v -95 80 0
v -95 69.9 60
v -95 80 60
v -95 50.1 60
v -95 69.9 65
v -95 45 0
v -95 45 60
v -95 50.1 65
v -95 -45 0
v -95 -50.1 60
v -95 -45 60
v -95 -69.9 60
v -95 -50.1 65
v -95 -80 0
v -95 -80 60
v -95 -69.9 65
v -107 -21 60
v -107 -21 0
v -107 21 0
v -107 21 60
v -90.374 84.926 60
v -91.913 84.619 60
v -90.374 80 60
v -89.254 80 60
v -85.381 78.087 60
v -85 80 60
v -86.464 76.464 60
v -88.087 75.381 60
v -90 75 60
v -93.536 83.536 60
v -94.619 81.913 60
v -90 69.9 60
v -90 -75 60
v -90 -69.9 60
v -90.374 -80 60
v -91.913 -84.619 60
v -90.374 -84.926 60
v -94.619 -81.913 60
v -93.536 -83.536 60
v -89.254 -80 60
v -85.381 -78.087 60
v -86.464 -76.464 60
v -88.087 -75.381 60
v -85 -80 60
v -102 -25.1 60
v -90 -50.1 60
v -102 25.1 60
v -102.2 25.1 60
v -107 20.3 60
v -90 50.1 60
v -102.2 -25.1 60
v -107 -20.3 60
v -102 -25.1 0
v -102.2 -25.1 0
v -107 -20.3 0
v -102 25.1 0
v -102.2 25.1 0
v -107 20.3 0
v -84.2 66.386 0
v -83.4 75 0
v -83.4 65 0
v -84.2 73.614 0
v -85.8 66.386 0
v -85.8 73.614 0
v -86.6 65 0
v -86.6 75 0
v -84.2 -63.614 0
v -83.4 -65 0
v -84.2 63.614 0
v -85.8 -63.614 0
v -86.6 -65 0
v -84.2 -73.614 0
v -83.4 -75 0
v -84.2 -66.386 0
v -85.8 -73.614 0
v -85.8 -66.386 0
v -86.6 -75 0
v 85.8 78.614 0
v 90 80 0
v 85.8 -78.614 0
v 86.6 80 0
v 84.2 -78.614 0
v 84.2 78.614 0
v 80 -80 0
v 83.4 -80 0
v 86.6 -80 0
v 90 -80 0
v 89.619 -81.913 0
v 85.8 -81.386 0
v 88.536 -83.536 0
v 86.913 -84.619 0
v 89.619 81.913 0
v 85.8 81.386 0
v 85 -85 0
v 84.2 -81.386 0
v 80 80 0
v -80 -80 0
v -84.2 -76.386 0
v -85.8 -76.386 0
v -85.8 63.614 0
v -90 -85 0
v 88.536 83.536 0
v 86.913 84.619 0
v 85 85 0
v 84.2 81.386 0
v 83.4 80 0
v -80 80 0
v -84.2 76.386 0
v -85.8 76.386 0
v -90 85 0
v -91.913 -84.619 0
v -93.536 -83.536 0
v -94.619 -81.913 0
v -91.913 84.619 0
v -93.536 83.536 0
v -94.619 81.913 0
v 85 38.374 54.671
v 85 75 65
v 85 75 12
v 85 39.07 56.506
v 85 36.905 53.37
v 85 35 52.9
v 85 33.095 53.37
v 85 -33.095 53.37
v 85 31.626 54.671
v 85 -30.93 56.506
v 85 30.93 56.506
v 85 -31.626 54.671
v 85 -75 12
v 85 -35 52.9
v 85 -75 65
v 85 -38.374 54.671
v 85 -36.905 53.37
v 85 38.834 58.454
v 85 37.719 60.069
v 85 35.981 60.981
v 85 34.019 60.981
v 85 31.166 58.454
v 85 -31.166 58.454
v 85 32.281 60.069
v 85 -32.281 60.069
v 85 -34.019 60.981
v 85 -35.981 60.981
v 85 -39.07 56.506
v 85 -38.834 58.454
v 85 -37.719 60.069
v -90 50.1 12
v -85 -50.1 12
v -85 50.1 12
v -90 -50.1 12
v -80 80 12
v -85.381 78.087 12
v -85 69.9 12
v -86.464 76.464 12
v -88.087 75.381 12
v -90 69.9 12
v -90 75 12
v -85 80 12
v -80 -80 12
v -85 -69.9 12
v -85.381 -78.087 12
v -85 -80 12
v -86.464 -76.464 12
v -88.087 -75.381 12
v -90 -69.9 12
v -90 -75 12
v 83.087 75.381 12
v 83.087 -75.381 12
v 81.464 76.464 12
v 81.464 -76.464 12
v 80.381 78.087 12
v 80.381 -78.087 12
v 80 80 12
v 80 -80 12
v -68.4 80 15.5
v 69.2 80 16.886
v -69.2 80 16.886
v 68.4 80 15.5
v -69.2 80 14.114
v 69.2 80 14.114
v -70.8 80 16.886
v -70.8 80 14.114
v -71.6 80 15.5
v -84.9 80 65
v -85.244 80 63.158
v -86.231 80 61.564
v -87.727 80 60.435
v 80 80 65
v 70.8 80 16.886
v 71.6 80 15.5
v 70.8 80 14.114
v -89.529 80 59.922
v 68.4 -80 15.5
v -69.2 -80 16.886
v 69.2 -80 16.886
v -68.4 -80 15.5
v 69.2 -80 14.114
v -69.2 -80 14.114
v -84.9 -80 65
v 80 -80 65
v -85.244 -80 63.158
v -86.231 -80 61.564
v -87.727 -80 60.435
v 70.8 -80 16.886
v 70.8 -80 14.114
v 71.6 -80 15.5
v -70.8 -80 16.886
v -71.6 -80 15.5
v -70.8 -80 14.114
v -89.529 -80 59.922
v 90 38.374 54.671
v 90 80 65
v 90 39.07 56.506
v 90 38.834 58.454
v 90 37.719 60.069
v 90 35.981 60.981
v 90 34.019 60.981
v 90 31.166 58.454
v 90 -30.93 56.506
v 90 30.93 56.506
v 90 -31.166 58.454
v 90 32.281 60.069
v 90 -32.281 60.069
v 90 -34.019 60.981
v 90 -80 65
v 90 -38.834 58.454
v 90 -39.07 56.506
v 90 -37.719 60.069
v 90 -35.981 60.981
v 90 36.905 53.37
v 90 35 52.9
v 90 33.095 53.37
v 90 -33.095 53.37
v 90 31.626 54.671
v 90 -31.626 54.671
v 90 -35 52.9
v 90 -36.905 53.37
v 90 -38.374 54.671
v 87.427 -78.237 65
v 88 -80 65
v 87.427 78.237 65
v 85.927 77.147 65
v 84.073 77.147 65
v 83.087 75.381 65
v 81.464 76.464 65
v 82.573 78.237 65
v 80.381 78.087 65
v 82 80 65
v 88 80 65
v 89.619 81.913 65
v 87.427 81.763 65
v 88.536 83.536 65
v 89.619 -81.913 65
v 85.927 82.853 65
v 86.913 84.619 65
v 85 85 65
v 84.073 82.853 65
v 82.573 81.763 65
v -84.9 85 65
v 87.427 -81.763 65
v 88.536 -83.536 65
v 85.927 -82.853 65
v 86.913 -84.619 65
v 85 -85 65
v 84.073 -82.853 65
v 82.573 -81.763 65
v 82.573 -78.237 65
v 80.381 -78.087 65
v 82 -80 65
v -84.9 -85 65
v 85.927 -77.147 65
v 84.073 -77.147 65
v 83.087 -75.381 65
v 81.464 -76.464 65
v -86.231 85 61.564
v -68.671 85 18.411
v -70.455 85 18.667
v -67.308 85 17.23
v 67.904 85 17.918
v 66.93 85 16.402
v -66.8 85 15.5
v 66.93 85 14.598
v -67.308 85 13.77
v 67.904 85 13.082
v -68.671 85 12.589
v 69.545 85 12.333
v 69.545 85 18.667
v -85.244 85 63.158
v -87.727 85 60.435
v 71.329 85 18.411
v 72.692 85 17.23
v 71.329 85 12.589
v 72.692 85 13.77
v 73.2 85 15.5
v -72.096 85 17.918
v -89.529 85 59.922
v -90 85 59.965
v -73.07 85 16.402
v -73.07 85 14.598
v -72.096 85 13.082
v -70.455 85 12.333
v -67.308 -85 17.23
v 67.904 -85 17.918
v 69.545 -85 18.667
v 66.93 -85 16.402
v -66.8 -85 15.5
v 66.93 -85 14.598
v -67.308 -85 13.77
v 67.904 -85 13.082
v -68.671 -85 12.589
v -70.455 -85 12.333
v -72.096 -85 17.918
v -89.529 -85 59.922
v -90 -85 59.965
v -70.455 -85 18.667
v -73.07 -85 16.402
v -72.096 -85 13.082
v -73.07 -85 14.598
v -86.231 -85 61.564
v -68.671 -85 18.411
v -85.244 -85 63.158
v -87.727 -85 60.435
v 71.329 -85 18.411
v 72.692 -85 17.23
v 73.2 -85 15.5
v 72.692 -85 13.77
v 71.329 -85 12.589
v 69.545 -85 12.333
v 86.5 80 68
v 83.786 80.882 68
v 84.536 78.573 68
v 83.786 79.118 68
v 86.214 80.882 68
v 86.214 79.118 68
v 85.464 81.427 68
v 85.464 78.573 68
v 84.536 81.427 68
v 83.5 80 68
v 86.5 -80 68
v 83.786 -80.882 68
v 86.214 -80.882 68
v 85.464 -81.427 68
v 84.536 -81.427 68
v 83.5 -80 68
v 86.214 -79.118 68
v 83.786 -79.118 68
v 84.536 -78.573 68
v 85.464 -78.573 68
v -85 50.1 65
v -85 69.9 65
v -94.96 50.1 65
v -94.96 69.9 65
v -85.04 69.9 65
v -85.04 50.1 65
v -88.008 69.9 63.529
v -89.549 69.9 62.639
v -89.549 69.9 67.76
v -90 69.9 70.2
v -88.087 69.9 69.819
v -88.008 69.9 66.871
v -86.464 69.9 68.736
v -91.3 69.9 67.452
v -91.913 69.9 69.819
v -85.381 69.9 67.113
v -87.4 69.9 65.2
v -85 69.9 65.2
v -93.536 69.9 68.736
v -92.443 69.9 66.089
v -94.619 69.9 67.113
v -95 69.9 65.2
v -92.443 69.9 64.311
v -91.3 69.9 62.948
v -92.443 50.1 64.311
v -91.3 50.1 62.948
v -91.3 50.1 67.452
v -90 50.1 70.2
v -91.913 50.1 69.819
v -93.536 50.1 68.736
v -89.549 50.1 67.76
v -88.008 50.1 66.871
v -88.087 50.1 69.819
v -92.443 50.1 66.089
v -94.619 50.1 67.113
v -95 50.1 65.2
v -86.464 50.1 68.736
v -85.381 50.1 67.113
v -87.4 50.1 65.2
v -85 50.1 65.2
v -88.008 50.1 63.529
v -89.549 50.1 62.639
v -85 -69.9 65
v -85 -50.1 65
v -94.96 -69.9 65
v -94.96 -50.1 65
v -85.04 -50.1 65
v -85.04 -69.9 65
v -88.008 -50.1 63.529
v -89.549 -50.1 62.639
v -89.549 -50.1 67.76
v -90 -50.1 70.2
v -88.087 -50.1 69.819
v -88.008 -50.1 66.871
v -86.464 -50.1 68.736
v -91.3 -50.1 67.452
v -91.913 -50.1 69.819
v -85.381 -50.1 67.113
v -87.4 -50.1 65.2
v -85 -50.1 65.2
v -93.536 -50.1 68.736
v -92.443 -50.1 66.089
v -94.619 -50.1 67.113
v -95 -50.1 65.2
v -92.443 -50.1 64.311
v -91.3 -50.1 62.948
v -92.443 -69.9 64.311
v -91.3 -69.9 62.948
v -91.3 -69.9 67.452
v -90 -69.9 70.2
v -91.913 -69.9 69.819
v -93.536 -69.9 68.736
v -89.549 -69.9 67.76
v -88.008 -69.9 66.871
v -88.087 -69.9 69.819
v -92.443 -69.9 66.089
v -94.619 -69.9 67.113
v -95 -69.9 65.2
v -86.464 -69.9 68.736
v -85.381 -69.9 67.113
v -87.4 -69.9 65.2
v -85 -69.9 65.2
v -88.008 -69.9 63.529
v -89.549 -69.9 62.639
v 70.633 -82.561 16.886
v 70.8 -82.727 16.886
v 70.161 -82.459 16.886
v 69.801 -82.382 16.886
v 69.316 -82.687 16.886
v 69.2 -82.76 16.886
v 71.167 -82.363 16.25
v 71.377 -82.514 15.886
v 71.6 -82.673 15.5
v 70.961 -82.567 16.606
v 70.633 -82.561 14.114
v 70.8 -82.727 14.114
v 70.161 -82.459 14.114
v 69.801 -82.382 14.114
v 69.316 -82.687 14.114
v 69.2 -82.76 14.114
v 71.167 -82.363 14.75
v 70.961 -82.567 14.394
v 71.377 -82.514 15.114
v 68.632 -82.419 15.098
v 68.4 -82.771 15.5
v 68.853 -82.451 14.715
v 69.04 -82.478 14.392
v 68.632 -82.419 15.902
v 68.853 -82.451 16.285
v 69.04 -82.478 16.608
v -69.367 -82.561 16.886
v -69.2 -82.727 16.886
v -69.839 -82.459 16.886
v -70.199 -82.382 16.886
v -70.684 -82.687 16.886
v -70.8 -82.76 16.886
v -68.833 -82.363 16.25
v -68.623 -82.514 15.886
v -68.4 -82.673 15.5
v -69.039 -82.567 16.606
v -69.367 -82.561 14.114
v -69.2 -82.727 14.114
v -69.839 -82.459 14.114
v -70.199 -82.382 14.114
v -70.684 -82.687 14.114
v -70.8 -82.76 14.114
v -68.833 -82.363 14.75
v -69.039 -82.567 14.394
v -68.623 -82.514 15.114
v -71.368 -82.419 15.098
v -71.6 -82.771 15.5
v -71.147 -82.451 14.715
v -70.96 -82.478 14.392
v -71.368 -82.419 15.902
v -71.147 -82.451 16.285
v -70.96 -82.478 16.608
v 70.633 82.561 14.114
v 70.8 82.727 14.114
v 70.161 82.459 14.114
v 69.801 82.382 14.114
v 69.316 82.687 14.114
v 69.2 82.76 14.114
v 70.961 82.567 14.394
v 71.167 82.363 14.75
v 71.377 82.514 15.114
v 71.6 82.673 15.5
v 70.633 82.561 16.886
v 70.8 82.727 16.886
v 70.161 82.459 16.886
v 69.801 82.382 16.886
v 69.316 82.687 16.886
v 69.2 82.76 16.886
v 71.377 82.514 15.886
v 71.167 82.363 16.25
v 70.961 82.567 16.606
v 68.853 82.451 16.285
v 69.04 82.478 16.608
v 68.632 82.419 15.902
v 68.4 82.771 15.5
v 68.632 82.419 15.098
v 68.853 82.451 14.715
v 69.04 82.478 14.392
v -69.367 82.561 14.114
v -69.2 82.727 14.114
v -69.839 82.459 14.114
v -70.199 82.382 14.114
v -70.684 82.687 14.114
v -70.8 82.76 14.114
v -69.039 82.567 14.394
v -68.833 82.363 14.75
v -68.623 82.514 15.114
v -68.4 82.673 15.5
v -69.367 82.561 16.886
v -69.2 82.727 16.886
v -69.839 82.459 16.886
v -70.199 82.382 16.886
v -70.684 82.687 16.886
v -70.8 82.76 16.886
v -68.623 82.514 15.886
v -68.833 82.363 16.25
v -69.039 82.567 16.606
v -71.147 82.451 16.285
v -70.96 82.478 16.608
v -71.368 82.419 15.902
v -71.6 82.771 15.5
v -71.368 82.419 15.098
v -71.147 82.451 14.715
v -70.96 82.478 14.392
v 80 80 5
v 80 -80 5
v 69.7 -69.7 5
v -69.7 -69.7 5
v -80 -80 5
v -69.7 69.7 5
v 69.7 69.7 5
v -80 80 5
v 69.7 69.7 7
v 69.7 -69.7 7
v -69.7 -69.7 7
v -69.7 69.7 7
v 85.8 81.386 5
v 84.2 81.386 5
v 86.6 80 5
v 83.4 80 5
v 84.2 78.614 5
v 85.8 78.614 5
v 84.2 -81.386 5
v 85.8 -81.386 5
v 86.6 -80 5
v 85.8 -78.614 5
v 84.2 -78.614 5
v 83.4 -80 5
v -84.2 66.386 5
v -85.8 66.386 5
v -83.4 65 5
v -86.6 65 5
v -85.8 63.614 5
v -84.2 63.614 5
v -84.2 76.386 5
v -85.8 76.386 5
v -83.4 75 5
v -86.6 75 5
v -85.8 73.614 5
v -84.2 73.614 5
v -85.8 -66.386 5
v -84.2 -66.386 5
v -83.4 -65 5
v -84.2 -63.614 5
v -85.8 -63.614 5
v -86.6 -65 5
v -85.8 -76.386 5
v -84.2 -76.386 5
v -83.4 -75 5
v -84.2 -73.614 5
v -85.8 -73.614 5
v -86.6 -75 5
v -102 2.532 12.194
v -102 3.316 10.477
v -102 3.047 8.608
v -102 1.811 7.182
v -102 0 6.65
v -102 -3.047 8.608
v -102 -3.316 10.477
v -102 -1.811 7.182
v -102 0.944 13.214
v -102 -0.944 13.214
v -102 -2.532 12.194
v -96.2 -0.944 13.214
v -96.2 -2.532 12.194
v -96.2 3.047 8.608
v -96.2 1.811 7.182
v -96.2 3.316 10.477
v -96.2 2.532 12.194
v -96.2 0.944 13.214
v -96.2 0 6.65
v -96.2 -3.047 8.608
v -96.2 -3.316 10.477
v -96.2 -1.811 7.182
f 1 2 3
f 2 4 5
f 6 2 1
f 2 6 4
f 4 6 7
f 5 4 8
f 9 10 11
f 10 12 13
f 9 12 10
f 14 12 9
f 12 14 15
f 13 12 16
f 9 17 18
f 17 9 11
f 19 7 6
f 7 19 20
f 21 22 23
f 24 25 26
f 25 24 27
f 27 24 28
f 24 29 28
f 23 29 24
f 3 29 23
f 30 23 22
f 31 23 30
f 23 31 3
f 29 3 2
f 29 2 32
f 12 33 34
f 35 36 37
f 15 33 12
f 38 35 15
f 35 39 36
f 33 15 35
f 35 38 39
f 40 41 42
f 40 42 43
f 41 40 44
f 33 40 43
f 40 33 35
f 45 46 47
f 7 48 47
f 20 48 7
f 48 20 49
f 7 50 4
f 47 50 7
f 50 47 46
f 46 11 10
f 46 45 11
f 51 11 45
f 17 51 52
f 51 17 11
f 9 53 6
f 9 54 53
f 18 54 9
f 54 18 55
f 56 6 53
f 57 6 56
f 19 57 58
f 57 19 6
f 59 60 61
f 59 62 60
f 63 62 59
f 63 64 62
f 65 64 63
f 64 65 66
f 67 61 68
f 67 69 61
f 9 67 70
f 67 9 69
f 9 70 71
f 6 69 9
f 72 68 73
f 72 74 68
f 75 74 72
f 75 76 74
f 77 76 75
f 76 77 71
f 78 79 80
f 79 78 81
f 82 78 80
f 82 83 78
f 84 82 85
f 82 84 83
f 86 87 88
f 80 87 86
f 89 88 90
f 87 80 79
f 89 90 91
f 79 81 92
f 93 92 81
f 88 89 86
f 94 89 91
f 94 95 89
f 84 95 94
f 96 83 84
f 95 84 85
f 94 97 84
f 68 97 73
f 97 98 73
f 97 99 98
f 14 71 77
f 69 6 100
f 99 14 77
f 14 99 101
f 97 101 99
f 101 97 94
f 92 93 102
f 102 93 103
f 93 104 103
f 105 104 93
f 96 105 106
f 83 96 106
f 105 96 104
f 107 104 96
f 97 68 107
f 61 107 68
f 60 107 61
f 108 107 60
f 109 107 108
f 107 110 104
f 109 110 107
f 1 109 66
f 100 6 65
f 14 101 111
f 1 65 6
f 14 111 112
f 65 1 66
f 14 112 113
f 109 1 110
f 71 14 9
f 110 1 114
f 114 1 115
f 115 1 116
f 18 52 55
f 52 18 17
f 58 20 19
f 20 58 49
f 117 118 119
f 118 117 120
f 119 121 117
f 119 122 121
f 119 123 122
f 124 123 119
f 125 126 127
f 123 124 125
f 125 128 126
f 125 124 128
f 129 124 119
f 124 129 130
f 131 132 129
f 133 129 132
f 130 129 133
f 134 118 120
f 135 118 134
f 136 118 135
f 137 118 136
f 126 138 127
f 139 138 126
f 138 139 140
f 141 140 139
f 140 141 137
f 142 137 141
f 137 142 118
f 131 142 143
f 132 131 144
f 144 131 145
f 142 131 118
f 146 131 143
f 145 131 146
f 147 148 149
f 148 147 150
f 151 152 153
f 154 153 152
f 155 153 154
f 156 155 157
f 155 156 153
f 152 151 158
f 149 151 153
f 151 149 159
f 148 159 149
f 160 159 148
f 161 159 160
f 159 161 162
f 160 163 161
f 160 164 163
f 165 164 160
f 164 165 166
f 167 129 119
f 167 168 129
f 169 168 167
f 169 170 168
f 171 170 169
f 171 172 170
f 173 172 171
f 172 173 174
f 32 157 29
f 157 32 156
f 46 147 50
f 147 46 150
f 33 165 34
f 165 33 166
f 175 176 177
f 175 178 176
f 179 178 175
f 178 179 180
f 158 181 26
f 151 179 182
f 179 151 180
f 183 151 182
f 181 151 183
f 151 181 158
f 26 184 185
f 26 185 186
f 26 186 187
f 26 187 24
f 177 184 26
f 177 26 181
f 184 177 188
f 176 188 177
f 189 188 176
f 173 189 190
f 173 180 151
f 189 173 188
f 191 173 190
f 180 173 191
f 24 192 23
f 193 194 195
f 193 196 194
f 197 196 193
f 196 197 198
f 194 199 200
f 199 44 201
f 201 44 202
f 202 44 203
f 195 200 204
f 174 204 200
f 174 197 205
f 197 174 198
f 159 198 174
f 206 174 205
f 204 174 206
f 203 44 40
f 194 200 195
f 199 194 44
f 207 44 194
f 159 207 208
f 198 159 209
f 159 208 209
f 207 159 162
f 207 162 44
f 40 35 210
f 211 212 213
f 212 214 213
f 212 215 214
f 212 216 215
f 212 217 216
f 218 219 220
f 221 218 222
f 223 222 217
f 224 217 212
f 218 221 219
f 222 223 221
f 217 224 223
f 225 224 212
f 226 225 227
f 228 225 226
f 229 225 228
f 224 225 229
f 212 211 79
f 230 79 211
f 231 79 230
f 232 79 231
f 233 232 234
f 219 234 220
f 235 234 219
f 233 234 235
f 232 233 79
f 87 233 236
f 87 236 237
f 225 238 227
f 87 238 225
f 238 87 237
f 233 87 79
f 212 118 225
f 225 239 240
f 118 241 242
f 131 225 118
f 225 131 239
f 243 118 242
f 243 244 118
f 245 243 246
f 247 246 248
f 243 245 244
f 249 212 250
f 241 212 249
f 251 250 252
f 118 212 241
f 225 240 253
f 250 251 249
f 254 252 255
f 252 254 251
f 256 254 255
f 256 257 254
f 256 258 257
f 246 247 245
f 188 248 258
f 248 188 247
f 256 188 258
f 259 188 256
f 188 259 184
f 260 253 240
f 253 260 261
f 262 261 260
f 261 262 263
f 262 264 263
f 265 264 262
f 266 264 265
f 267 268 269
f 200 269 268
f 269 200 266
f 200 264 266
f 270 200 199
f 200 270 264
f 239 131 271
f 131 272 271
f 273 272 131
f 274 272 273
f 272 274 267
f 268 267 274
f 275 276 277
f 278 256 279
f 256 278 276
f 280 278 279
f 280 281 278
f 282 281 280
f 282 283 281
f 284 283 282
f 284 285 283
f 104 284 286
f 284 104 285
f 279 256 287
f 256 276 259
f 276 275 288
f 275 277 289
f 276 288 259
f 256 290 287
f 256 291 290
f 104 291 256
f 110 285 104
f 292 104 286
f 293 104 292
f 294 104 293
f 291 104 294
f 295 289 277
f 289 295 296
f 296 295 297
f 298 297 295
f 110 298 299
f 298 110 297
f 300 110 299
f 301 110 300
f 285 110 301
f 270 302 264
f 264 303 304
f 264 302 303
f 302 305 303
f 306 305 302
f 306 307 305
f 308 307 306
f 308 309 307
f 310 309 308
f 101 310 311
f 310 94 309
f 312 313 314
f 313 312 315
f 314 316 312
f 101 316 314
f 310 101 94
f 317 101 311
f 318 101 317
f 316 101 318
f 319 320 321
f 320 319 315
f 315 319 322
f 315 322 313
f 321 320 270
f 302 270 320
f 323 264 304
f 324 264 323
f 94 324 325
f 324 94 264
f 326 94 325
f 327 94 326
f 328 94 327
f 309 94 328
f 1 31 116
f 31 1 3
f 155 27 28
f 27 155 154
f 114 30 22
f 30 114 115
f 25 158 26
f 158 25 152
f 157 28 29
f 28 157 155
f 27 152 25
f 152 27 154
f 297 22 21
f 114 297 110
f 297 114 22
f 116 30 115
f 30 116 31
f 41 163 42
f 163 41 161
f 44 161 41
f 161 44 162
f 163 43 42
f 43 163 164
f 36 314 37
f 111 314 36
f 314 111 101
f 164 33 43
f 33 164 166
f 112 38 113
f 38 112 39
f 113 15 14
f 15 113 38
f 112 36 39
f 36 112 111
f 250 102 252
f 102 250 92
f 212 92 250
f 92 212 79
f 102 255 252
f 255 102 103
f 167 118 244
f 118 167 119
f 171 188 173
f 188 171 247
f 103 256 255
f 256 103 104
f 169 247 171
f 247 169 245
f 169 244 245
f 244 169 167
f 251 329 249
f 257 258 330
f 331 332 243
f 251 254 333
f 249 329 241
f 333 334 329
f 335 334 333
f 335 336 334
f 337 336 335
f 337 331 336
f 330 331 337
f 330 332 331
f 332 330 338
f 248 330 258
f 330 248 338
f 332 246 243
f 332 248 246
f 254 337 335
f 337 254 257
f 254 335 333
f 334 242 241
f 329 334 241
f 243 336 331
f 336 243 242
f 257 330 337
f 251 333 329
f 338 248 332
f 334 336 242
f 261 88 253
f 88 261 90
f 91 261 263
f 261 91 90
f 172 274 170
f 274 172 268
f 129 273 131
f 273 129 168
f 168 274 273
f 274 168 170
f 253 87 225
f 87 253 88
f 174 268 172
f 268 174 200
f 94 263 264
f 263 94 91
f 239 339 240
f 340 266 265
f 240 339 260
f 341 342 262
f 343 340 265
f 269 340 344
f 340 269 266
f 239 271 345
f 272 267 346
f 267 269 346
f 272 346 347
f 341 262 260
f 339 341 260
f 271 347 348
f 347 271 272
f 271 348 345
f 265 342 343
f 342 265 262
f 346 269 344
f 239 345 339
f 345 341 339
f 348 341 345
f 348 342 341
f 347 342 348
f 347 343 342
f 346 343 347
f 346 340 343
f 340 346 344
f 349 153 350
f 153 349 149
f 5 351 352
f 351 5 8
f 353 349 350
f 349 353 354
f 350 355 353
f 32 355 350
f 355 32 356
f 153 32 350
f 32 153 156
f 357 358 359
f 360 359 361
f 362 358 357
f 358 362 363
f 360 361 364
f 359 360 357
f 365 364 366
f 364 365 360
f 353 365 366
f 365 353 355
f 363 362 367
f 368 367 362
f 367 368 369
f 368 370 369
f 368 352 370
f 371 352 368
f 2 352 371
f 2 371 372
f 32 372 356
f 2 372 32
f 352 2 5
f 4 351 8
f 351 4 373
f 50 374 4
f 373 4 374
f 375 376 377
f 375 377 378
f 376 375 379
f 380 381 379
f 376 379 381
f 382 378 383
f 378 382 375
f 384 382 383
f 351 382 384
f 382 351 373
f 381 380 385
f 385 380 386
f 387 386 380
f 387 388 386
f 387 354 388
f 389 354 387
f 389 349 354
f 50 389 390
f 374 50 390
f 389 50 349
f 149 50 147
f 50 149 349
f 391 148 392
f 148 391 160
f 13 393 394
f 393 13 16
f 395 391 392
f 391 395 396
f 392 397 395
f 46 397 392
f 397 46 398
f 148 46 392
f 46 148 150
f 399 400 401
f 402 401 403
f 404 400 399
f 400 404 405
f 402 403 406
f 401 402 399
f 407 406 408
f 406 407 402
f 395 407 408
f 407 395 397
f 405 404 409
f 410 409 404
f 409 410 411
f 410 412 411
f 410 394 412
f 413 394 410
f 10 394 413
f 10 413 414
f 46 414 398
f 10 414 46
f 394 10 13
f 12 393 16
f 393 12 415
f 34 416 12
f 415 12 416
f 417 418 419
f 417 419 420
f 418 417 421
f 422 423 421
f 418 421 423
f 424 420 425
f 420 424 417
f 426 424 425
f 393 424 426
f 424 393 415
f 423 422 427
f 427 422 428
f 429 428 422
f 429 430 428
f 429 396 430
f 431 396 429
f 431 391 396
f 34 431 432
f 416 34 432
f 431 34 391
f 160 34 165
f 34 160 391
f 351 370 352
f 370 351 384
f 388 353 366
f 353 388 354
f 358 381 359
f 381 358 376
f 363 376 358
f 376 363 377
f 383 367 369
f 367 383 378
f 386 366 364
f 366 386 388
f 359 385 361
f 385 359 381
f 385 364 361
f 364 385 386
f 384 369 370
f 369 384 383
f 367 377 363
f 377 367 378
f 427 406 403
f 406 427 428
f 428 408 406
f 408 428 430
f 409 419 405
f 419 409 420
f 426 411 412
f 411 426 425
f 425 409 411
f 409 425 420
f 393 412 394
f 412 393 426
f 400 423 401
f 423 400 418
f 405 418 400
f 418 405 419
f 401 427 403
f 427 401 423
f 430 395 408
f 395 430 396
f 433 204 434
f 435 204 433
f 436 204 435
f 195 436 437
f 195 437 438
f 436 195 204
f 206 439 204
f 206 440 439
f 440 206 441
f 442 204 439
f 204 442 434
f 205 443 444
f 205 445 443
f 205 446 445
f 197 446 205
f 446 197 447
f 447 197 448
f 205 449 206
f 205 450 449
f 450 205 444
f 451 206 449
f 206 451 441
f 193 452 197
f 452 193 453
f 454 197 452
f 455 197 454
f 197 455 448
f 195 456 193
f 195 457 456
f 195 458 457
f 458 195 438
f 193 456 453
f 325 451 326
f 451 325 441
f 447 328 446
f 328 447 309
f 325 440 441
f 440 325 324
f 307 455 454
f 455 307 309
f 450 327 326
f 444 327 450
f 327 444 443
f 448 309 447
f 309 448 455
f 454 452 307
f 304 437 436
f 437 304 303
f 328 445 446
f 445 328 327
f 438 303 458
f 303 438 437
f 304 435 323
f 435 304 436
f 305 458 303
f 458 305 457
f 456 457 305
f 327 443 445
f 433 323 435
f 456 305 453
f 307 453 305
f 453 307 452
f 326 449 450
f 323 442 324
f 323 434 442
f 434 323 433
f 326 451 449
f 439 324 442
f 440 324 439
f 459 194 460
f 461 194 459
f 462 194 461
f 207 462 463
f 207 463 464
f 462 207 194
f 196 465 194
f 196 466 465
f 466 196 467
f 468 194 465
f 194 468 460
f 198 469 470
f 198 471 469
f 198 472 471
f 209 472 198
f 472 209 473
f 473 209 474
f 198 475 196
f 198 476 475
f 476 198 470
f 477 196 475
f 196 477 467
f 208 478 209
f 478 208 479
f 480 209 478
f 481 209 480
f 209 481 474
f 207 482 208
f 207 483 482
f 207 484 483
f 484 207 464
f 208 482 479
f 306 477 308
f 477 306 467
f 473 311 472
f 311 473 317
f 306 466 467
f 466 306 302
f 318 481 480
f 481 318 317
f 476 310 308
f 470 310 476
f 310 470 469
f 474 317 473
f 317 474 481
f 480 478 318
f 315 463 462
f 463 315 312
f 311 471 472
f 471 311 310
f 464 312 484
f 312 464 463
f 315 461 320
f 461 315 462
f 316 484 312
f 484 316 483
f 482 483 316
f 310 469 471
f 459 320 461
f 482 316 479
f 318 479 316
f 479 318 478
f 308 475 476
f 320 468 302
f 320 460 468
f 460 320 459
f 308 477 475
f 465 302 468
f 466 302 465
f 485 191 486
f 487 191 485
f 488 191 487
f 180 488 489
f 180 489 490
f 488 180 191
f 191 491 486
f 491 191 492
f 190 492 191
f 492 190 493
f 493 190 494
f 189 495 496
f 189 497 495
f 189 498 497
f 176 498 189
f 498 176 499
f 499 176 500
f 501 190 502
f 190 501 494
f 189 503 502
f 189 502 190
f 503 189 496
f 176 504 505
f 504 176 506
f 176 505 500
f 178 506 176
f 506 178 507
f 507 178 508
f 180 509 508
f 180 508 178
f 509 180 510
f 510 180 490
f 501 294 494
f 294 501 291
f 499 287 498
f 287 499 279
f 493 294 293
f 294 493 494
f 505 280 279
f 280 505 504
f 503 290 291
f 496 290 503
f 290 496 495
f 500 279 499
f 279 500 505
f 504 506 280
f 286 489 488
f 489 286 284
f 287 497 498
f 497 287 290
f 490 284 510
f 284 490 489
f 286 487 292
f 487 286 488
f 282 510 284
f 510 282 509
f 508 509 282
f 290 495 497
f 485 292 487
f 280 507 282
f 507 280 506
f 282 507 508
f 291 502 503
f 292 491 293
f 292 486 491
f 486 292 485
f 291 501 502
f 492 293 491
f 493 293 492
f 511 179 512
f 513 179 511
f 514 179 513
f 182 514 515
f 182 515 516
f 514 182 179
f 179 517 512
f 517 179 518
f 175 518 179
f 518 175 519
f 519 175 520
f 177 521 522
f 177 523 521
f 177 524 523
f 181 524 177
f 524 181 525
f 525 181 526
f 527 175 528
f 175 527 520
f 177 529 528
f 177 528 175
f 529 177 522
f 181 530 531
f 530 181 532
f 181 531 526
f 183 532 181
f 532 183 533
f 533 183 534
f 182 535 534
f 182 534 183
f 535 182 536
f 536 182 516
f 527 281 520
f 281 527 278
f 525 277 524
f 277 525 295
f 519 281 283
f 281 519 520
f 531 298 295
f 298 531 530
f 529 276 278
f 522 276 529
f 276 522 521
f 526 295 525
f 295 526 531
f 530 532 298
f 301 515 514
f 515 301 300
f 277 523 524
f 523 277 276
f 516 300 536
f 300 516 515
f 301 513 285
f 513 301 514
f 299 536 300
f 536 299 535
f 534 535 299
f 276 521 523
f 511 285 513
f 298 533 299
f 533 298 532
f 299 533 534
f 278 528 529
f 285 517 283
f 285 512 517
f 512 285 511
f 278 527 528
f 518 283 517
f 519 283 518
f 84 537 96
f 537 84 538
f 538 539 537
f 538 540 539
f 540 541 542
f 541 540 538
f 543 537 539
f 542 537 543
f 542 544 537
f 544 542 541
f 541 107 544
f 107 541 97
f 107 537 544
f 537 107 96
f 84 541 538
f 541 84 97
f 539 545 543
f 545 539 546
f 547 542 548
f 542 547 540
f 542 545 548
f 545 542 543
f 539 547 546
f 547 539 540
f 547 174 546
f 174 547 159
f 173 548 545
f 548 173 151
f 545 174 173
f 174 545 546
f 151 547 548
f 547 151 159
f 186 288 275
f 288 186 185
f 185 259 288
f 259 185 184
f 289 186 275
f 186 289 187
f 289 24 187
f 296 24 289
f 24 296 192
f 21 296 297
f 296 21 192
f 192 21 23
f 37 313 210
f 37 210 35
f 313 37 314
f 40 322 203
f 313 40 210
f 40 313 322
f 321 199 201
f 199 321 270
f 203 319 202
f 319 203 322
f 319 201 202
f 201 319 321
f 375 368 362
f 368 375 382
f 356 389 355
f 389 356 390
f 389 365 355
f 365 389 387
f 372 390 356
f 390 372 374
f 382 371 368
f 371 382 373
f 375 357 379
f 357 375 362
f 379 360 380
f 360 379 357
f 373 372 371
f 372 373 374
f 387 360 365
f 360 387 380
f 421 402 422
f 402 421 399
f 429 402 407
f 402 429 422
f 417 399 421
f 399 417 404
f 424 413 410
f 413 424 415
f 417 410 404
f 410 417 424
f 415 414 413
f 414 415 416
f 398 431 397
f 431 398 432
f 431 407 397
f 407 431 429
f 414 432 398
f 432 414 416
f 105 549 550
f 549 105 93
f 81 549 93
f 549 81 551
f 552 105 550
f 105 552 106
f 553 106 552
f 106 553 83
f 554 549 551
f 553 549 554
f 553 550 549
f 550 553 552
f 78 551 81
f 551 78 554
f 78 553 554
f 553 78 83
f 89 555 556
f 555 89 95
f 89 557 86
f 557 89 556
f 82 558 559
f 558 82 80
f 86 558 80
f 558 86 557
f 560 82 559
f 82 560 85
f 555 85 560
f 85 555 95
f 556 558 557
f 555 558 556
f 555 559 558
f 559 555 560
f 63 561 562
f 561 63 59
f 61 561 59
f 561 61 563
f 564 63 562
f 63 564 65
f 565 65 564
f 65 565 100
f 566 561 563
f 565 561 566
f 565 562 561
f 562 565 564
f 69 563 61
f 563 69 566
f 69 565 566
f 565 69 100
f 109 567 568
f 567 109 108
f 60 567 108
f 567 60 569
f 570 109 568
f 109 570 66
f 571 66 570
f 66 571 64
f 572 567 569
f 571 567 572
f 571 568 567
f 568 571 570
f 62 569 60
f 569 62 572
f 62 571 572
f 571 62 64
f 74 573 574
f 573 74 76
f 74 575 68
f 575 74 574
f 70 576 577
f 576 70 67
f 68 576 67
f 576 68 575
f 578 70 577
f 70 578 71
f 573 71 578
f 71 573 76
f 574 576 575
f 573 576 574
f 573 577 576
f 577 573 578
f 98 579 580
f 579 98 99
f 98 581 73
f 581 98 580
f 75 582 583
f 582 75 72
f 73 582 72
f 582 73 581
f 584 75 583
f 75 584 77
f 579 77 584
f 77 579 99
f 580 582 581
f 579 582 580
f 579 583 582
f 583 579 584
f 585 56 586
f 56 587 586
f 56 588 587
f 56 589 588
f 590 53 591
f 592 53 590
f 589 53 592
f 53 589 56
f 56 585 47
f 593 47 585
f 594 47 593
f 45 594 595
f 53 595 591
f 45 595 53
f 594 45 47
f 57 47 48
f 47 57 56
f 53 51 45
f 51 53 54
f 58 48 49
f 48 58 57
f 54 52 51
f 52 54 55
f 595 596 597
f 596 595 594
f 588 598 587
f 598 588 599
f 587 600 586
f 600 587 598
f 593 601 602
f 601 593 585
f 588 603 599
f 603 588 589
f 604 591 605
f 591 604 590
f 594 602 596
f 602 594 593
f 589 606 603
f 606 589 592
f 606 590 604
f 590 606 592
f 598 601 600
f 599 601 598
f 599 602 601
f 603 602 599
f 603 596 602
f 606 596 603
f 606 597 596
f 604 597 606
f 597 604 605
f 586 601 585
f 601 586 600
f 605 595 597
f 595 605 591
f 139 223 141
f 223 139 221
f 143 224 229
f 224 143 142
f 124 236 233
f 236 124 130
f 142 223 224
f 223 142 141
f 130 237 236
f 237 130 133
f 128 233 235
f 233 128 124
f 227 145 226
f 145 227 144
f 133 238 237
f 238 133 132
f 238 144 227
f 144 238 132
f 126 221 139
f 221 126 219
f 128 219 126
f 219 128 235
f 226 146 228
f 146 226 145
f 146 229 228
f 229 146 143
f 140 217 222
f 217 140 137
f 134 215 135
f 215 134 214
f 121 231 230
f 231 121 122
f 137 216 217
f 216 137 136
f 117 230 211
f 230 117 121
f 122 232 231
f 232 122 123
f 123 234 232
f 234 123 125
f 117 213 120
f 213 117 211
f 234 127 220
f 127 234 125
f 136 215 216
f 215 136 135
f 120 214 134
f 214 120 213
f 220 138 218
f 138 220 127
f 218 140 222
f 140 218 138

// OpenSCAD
// file: config_4x5.scad
/*
This is the base configuration file for the 4x5" format
# we are not using the exact ANSI measures, but slightly rounded measures for slight simplification
*/
vStabilizerTotal_h = 7;

// general tolerance
vTolerance = 0.2;

// sheet film and cassette measurements (roughly based on the ANSI measurements)
vFilmSheet_l = 127;
vFilmSheet_w = 102;
vCassette_l = 160; // A min
vCassette_w = 121; // B max
vCassette_h = 13.2; // C max
vLightTrap_l = 2; // M2
vLightTrap_w = vCassette_w;
vLightTrap_h = 1.5; // M1
vLightTrap_offsetX = 141; // G max
vFilmWindow_l = 121;
vFilmWindow_w = 101;
vFilmWindow_offsetX = 16;
vGroundGlass_offsetZ = 5;

// Graflok
vGraflok_h = 6; // this is not the official measurement, just measured from a camera 

// lens board measures (we are using Wista/Technika-style lensboards)
vLensboard_l = 100;
vLensboard_w = 97;
vLensboard_h = 2;
vLensboard_offsetX = -(vLensboard_l+3)/2; // caution: we have an asymetric offset!
vLensboard_offsetY = -vLensboard_w/2;
vLensboardHole_d = 85;
vLensboardLighttrap_d = 89;
vLensboardLighttrap_h = 1+vTolerance;

// bellows frame measures - the bellows frame design is derived from standardcameras.com
// back frame
vBellowsBackInner_l = 144; //???? check and replace with the measurement from your bellows!
vBellowsBackInner_w = vBellowsBackInner_l;
vBellowsBackOuter_l = vBellowsBackInner_l+1;
vBellowsBackOuter_w = vBellowsBackOuter_l;

vBellowsBackFrameOuter_l = 159;
vBellowsBackFrameOuter_w = vBellowsBackFrameOuter_l;
vBellowsBackFrameOuter_h = 7;
vBellowsBackFrameInner_l = 135;
vBellowsBackFrameInner_w = vBellowsBackFrameInner_l;
vBellowsBackFrameInner_h = 5;

vBellowsBackLightTrapOuter_l = vBellowsBackFrameInner_l+2*2;
vBellowsBackLightTrapOuter_w = vBellowsBackLightTrapOuter_l;
vBellowsBackLightTrap_h = 3;

//vBellowsBackFrameScrewHole_d = 2;
//vBellowsBackFrameScrewHole_h = 10;
vBellowsBackFrameScrewHole_offsetXY = 70;
vBellowsBackFrameScrewHole_offsetZ = vBellowsBackFrameOuter_h/2;

// front frame
vBellowsFrontInner_l = 94; //???? check and replace with the measurement from your bellows!
vBellowsFrontInner_w = vBellowsFrontInner_l;
vBellowsFrontOuter_l = vBellowsFrontInner_l+1;
vBellowsFrontOuter_w = vBellowsFrontOuter_l;

vBellowsFrontFrameOuter_l = 104;
vBellowsFrontFrameOuter_w = vBellowsFrontFrameOuter_l;
vBellowsFrontFrameOuter_h = 7;
vBellowsFrontFrameInner_l = 82;
vBellowsFrontFrameInner_w = vBellowsFrontFrameInner_l;
vBellowsFrontFrameInner_h = 5;

vBellowsFrontLightTrapOuter_l = vBellowsFrontFrameInner_l+2*2;
vBellowsFrontLightTrapOuter_w = vBellowsFrontLightTrapOuter_l;
vBellowsFrontLightTrap_h = 0;

//vBellowsFrontFrameScrewHole_d = 2;
//vBellowsFrontFrameScrewHole_h = 10;
vBellowsFrontFrameScrewHole_offsetXY = 40;
vBellowsFrontFrameScrewHole_offsetZ = vBellowsFrontFrameOuter_h/2;

// body dimensions
vWall_strength = 5;
vBodyOuter_l = 185; // make sure this is at least 4*vWall_strength larger than vBellowsBackFrameOuter_l!
vBodyOuter_w = 170; // make sure this is at least 2*vWall_strength larger than vBellowsBackFrameOuter_l!
vBodyOuter_h = 65;
vBodyEdge_r = vWall_strength;

// we will center our model on the Y axis and on the center of the bellows frame
// at least for the 4x5 version, we have to do an asymetric offset of 2.5mm on the X-axis 
vAsymOffsetX = -2.5;  

// back plate
vBackPlateLength = 160; // we will probably use about the same size as the bellows back frame
vBackPlateStrength = vWall_strength;

// hinges for front lid
vHingeInnerDistance = 100;
vHingeBaseWidth = 20;
vHingeHole = 5;

// lid lock measures
vLidLockBase_d = 8;
vLidLockHole_distance = 70;

// rail dimensions
vLowerRail_w = 90;
vUpperRail_w = vLowerRail_w;

// cutout for stop indents
vStopIndent_l = 4;
vStopIndent_h = 5;
vStopIndentDistance = 25; // shorter than 25 is not necessary
vStopIndent_offsetX = 20; // don't go shorter than 20 if you intend to use a 90mm lens!

// for all dovetails we use a base width of 5mm and a base height of 5mm
// we are applying tolerances to the inner AND outer part of a dovetail, in width and height
vDoveTail_w = 5;
vDoveTail_h = 5;
vDoveTail_tolerance = 0.2;

// front standard carrier / slider
// width is depending on vUpperRail_w
vSliderBase_w = vUpperRail_w + (4*vDoveTail_w);
vSliderBase_l = 40; // make sure to have enough space in the body.


// lever plate 
vLeverPlateBase_w = vUpperRail_w - (8*vDoveTail_w);
vLeverPlateBlock_w = 25;
vLeverPlateBlock_l = vSliderBase_l-(2*vDoveTail_w);

vFrontStandard_h = 130;
vFrontStandardSlot_h = vFrontStandard_h - 30;

// lensboard carrier
vFrontPlate_length = vSliderBase_w+6; // vSliderBase_w is a bit too tight for 4x5", so there we will add 5mm, for 5x7 vSliderBase_w is OK to get a squared lensboard carrier
vFrontPlate_width = vSliderBase_w; //vFrontPlate_length;
vFrontPlate_height = 16;
vEdgeCutCylinder = floor(sqrt(2*pow(vFrontPlate_width,2)))-5;

vTiltDovetailBase_d1 = 30;
vTiltDovetailBase_d2 = vTiltDovetailBase_d1+(2*vDoveTail_w);
vTiltDovetailBaseBlock_d = vTiltDovetailBase_d1+(4*vDoveTail_w);

vTiltDovetail_d1 = vTiltDovetailBase_d1-vTolerance;
vTiltDovetail_d2 = vTiltDovetailBase_d2-vTolerance;
vTiltDovetail_h = vDoveTail_w-vTolerance;

vTiltDovetailCutout_d1 = vTiltDovetailBase_d2+vTolerance;
vTiltDovetailCutout_d2 = vTiltDovetailBase_d1+vTolerance;

vAxisHole_d = 10+vTolerance;
vAxisHole_h = vDoveTail_w+vTolerance;

vTiltLockBolt_d = 12;
vTiltLockBolt_h = 14;
vTiltLockBoltHole_d = 8;
vTiltLockBoltHole_h = vTiltLockBolt_h;

vTiltHeight = 50;
vTiltRadius = vFrontPlate_length/2;
vTiltAngleMinus = -7;
vTiltAnglePlus = 7;
vTiltAxis_d = 10-vTolerance;

// focusing rod
vFocusingRod_d = 6;
vFocusingKnob_d = 25;
vFocusingKnob_h = 20;

// stabilizer measures (just the outer measures of our stabilizer block, not the tripod slider)
vStabilizerBase_l = 135;
vStabilizerBase_w = 90;  
vStabilizerBase_h = 7;
vStabilizerDovetailBase_w = 50;
// screw holes for the stabilizer
vLidHoleCount_x = 4;
vLidHoleDist_x = 35;
vLidHoleCount_y = 2;
vLidHoleDist_y = 60;


// screw diameters, length is individually set
vScrew1Hole_d = 3;
vScrew1ThreadHole_d = 2.2;
vScrew2Hole_d = 2;
vScrew2ThreadHole_d = 1.4;


// Dimensions for small heat set insert holes.
// Sized for M2 inserts, 4 mm depth, 3.5 mm max OD
// (may be labelled M2x3.5x4)
vInsertM2Hole_d = 3.2;
vInsertM2MinDepth_h = 5.0;
vInsertM2Size_d = 3.5;
vInsertM2Depth_h = 4.0;

// Dimensions for heat set insert holes.
// Sized for "Voron standard" M3 inserts, 4 mm depth, 5 mm max OD
// (variously labelled M3x4x5 or M3x5x4)
vInsertM3Hole_d = 4.7;
vInsertM3MinDepth_h = 5.0;
vInsertM3Size_d = 5.0;
vInsertM3Depth_h = 4.0;

// Dimensions for large heat set insert holes.
// Sized for M5 inserts, 5 mm depth, 7 mm max OD
// (may be labelled M5x7x5)
vInsertM5Hole_d = 6.7;
vInsertM5MinDepth_h = 6.0;
vInsertM5Size_d = 7.0;
vInsertM5Depth_h = 5.0;
// file: modules.scad
/*
This is a collection of the modules which are used heavily within the whole project.
Almost all parts rely on the modules to remain "as is", especially regarding their current orientation.
So please act very carefully here, otherwise you may screw up the complete design!

*/
include <baseconfig.scad>;


// roof module - this is heavily used for dovetail cutouts
// please keep as is
module roof(l, w, h){
    polyhedron(
        points=[
            [0,0,0],
            [l,0,0],
            [l,w,0],
            [0,w,0],
            [0,w/2,h],
            [l,w/2,h]
            ],
        faces=[
            [0,1,2,3],
            [0,4,1],
            [1,4,5,2],
            [2,5,3],
            [3,5,4,0]
            ]
            );
    };

// a wedge module - this is heavily used for cutting edges
// please keep as is    
module wedge(l, w, h) {
    polyhedron(
            points=[
                [0,0,0],
                [l,0,0],
                [l,w,0],
                [0,w,0],
                [0,0,h],
                [l,0,h]
            ],
            faces=[
                [0,3,2,1],
                [0,1,5,4],
                [1,2,5],
                [2,3,4,5],
                [3,0,4]
            ]
    );
   };

// simple tube module.   
module tube(d1, d2, h) {
    difference() {
        cylinder(d=d1, h=h);
        cylinder(d=d2, h=h);
        };
    };

// mainly used for making holes for countersunk screws
// please keep as is    
module countersunk_screw(vScrew_d, vScrew_l){
    union(){
    cylinder(d=vScrew_d, h=vScrew_l);
    cylinder(d1=vScrew_d*2, h=vScrew_d);
    };
};

// module for making hexagons, e.g. hex nuts. kw is the key width
// please keep as is
module hex(kw, h) {
	render()
        translate([0, 0, h/2])
            intersection_for(a = [0, 120, 240]) {
                rotate([0, 0, a])
                    cube([kw, 3 * kw, h], true);
                }
}


// Heatset insert
// d: Thread diameter
// od: Outer diameter
// l: Total length
module insert(d, od, l)
{
    difference() {
        cylinder(l, d=od, $fn=15);
        translate([0, 0, -0.5]) cylinder(l+1, d=d, $fn=15);
        };
}

module insert_m2()
{
    color("gold") insert(2, vInsertM2Size_d, vInsertM2Depth_h);
}

module insert_m3()
{
    color("gold") insert(3, vInsertM3Size_d, vInsertM3Depth_h);
}

module insert_m5()
{
    color("gold") insert(5, vInsertM5Size_d, vInsertM5Depth_h);
}

// Countersunk screw, metric, for display
// Example: https://www.aliexpress.com/item/1005007838338973.html
module screw_cs(l, d=3, dk=6, s=2, t=1) {
    // l: total length (including head) in mm
    // d: thread diameter (eg 3 for M3)
    // dk: max head diameter
    // s: hex socket flat-to-flat size
    // t: hex socket depth
    difference() {
        union() {
            cylinder(h=l, r=d/2, $fn=15);
            cylinder(h=(dk-d)/2, r1=dk/2, r2=d/2, $fn=15);
            }
        cylinder(h=t, r=s/2*2/sqrt(3), $fn=6);
    }
}

module screw_m3_cs(l) {
    color("silver") screw_cs(l, d=3, dk=6, s=2, t=1);
}

// Button head screw, metric, for display
// Example: https://www.aliexpress.com/item/32967225441.html
module screw_bh(l, d=3, k=1.5, dk=5.5, s=2, t=1) {
    // l: shaft length (NOT including head) in mm
    // d: thread diameter (eg 3 for M3)
    // k: head depth
    // dk: head max diameter
    // s: hex socket flat-to-flat size
    // t: hex socket depth
    difference() {
        union() {
            translate([0, 0, k]) cylinder(h=l, r=d/2, $fn=15);
            difference() {
                translate([0, 0, k]) intersection() {
                    sphere(d=dk, $fn=15);
                    translate([-dk/2, -dk/2, -dk]) cube(dk);
                }
                translate([-dk/2, -dk/2, -dk]) cube(dk);
            }
        }
        cylinder(h=t, r=s/2*2/sqrt(3), $fn=6);
    }
}

module screw_m2_bh(l) {
    color("silver") screw_bh(l, d=2, dk=3.4, s=1.175, t=0.6);
}
// file: baseconfig.scad
/*
Here we define some variables which are independent from the camera format
*/


// some generic variables

// we are including a format specific configuration sheet - but make sure to include only one!

include <config_4x5.scad>;
// include <config_5x7.scad>;
// include <config_8x10.scad>;

// Arca Swiss tripod plate
// caution: some Arca Swiss compatible tripod heads may have slight variations
// vArca_length = xx; // the length is irrelevant here
vArca_width = 38;
vArca_height = 7;
vArcaBase_cutout = 4;
vArcaBase_height = 1.5;
// main file
// loading the base configuration
include <baseconfig.scad>;

// some modules such as hex, countersunk screws, roof, wedge are available in a module file
use <modules.scad>;

module body() {

vBellowsFrameUpperLength = vBellowsBackFrameOuter_l+1;
//vBellowsFrameLowerLength = vBellowsBackFrameInner_l+1;
vBellowsFrameLowerLength = vBellowsBackLightTrapOuter_l + 2*vTolerance;

vBottomWall_l = vWall_strength;
vBottomWall_w = vBodyOuter_w-(2*vWall_strength);
vBottomWall_h = vBodyOuter_h-vWall_strength;
vBottomWall_offsetX = -(vBodyOuter_l/2)+vAsymOffsetX;
vBottomWall_offsetY = -vBottomWall_w/2;
vBottomWall_offsetZ = 0;

vTopWall_l = vWall_strength;
vTopWall_w = vBodyOuter_w-(2*vWall_strength);
vTopWall_h = vBodyOuter_h;
vTopWall_offsetX = (vBodyOuter_l/2)+vAsymOffsetX-vWall_strength;
vTopWall_offsetY = -vTopWall_w/2;
vTopWall_offsetZ = 0;

vSideWall_l = vBodyOuter_l-(2*vWall_strength);
vSideWall_w = vWall_strength;
vSideWall_h = vBodyOuter_h;
vSideWall_offsetX = -(vSideWall_l/2)+vAsymOffsetX;
vSideWallLeft_offsetY = (vBodyOuter_w/2)-vWall_strength;
vSideWallRight_offsetY = -(vBodyOuter_w/2);
vSideWall_offsetZ = 0;

vEdgeBolt_d = 2*vWall_strength;
vBottomEdgeBolt_h = vBottomWall_h;
vTopEdgeBolt_h = vTopWall_h;
vBottomEdgeBolt_offsetX = -(vSideWall_l/2)+vAsymOffsetX;
vTopEdgeBolt_offsetX = (vSideWall_l/2)+vAsymOffsetX;
vEdgeBolt_offsetY = vBottomWall_w/2;
vEdgeBolt_offsetZ = 0;

vEdgeBoltCone_d1 = vEdgeBolt_d-4;
vEdgeBoltCone_d2 = vEdgeBoltCone_d1/2;
vEdgeBoltCone_h = vEdgeBoltCone_d1/2;
vEdgeBoltCone_offsetZ = vBodyOuter_h;

vBackPlate_l = vSideWall_l;
vBackPlate_w = vBottomWall_w;
vBackPlate_h = vBackPlateStrength+vBellowsBackFrameOuter_h; // 11
vBackPlate_offsetX = -(vBackPlate_l/2)+vAsymOffsetX; 
vBackPlate_offsetY = -vBackPlate_w/2; 
vBackPlate_offsetZ = 0; 

vBackWindow_l = vBellowsFrameLowerLength;
vBackWindow_w = vBellowsFrameLowerLength;
vBackWindow_h = vBackPlateStrength+vBellowsBackFrameOuter_h;
vBackWindow_offsetX = -vBackWindow_l/2;
vBackWindow_offsetY = -vBackWindow_w/2;
vBackWindow_offsetZ = 0;

vBackPlateCutout_l = vBackPlateLength;
vBackPlateCutout_w = vBackPlateLength;
vBackPlateCutout_h = vBackPlateStrength;
vBackPlateCutout_offsetX = -vBackPlateCutout_l/2;
vBackPlateCutout_offsetY = -vBackPlateCutout_w/2;
vBackPlateCutout_offsetZ = 0;

vBackPlateScrewHole_d = vInsertM2Hole_d;
vBackPlateScrewHole_h = vInsertM2MinDepth_h;
vBackPlateLockScrewHole_offsetX = vTopEdgeBolt_offsetX;
vBackPlateLockScrewHole_offsetY = vEdgeBolt_offsetY;
vBackPlateRailScrewHole_offsetX = -(vBackPlateLength/2)-5;
vBackPlateRailScrewHole_offsetYi = (vBackPlateLength/2)-5;
vBackPlateRailScrewHole_offsetYa = vBackPlateRailScrewHole_offsetYi-10;
vBackPlateScrewHole_offsetZ = 0;

// we will use a raw cylinder with 4 fragments for the cutout, so we have to calculate the diameters
vBellowsFrameCutoutLower_d = sqrt(2*pow(vBellowsFrameLowerLength,2));
vBellowsFrameCutoutUpper_d = sqrt(2*pow(vBellowsFrameUpperLength,2));
vBellowsFrameCutout_h = vBellowsBackFrameInner_h;
vBellowsFrameCutout_offsetX = 0;
vBellowsFrameCutout_offsetY = 0;
vBellowsFrameCutout_offsetZ = vBackPlateStrength+2;

vBellowsScrew_d = vScrew1Hole_d+vTolerance;
vBellowsScrew_h = vWall_strength;
vBellowsScrew_offsetX = vBellowsBackFrameScrewHole_offsetXY;
vBellowsScrew_offsetY = -(vBodyOuter_w/2);
vBellowsScrew_offsetZ = vBellowsFrameCutout_offsetZ+vBellowsBackFrameInner_h+vBellowsBackFrameScrewHole_offsetZ;

// hinges
vHingeOuter_d = 2*vWall_strength;
vHingeOuter_h = vHingeBaseWidth-vTolerance;
vHingeInner_d = vHingeHole+vTolerance;
vHingeInner_h = vHingeOuter_h;
vHinge_offsetX = vSideWall_offsetX;
vHinge_offsetY = (vHingeInnerDistance+vTolerance)/2;
vHinge_offsetZ = vSideWall_h+vTolerance; // we need 0.2 tolerance here, otherwise the lid won't close without force

vHingeColumn_l = vHingeOuter_d;
vHingeColumn_w = vHingeOuter_h;
vHingeColumn_h = vBottomWall_h+(vHingeOuter_d/2);
vHingeColumn_offsetX = vBottomWall_offsetX;
vHingeColumnLeft_offsetY = (vHingeInnerDistance+vTolerance)/2;
vHingeColumnRight_offsetY = -((vHingeInnerDistance-vTolerance)/2)-vHingeBaseWidth;
vHingeColumn_offsetZ = 0;

vHingeWallCutout_d = 2*vWall_strength+vTolerance; // we need 0.2 tolerance here, otherwise the 
vHingeWallCutout_h = vWall_strength;
vHingeWallCutout_offsetX = vHinge_offsetX;
vHingeWallCutout_offsetY = vSideWallLeft_offsetY;
vHingeWallCutout_offsetZ = vSideWall_h;

vStabilizerBlock_l = vBottomWall_h;
vStabilizerBlock_w = vStabilizerBase_w;
vStabilizerBlock_h = vStabilizerBase_h+vWall_strength;
vStabilizerBlock_offsetX = vBottomWall_offsetX;
vStabilizerBlock_offsetY = -vStabilizerBlock_w/2;
vStabilizerBlock_offsetZ = 0;

vStabilizerDovetail_l = vBottomWall_h;
vStabilizerDovetail_w = vStabilizerDovetailBase_w+vDoveTail_tolerance;
vStabilizerDovetail_offsetX = vStabilizerBlock_offsetX-vStabilizerBase_h-vDoveTail_tolerance;
vStabilizerDovetail_offsetY = -vStabilizerDovetail_w/2;
vStabilizerDovetail_offsetZ = 0;

vStabilizerDovetailToleranceCutout_l = vDoveTail_tolerance;
vStabilizerDovetailToleranceCutout_w = vStabilizerDovetail_w;
vStabilizerDovetailToleranceCutout_h = vBottomWall_h;
vStabilizerDovetailToleranceCutout_offsetX = vStabilizerDovetail_offsetX;
vStabilizerDovetailToleranceCutout_offsetY = vStabilizerDovetail_offsetY;
vStabilizerDovetailToleranceCutout_offsetZ = vStabilizerDovetail_offsetZ;

vLockingHole_d = vInsertM5Hole_d;
vLockingHole_h = vInsertM5MinDepth_h;
vLockingHole_offsetX = vStabilizerDovetail_offsetX;
vLockingHole_offsetY = 0;
vLockingHole_offsetZ = 10;

vLidLockHole_d = vLidLockBase_d+vTolerance;
vLidLockHole_h = vWall_strength;
vLidLockHole_offsetX = vTopWall_offsetX;
vLidLockHole_offsetY = -vLidLockHole_distance/2;
vLidLockHole_offsetZ = vTopWall_h-vLidLockBase_d;

// only as helper
//cylinder(d=160, h=20);

difference(){

    // box
    union(){
        // back plate
        translate([vBackPlate_offsetX, vBackPlate_offsetY, vBackPlate_offsetZ])
            cube([vBackPlate_l, vBackPlate_w, vBackPlate_h]);

        // bottom wall
        translate([vBottomWall_offsetX, vBottomWall_offsetY, vBottomWall_offsetZ])
            cube([vBottomWall_l, vBottomWall_w, vBottomWall_h]);
            
        // top wall
        translate([vTopWall_offsetX, vTopWall_offsetY, vTopWall_offsetZ])
            cube([vTopWall_l, vTopWall_w, vTopWall_h]); 
         
        // left side wall
        translate([vSideWall_offsetX, vSideWallLeft_offsetY, vSideWall_offsetZ])
            cube([vSideWall_l, vSideWall_w, vSideWall_h]); 
            
        // right side wall
        translate([vSideWall_offsetX, vSideWallRight_offsetY, vSideWall_offsetZ])
            cube([vSideWall_l, vSideWall_w, vSideWall_h]); 
            
        // edge bolts
            // bottom left
            translate([vBottomEdgeBolt_offsetX, vEdgeBolt_offsetY, vEdgeBolt_offsetZ])
                cylinder(d=vEdgeBolt_d, h=vBottomEdgeBolt_h);
            // bottom right
            translate([vBottomEdgeBolt_offsetX, -vEdgeBolt_offsetY, vEdgeBolt_offsetZ])
                cylinder(d=vEdgeBolt_d, h=vBottomEdgeBolt_h);
            // top left
            translate([vTopEdgeBolt_offsetX, vEdgeBolt_offsetY, vEdgeBolt_offsetZ])
                cylinder(d=vEdgeBolt_d, h=vTopEdgeBolt_h);
            translate([vTopEdgeBolt_offsetX, vEdgeBolt_offsetY, vEdgeBoltCone_offsetZ])
                cylinder(d1=vEdgeBoltCone_d1, d2=vEdgeBoltCone_d2, h=vEdgeBoltCone_h);    
            // top right
            translate([vTopEdgeBolt_offsetX, -vEdgeBolt_offsetY, vEdgeBolt_offsetZ])
                cylinder(d=vEdgeBolt_d, h=vTopEdgeBolt_h);
            translate([vTopEdgeBolt_offsetX, -vEdgeBolt_offsetY, vEdgeBoltCone_offsetZ])
                cylinder(d1=vEdgeBoltCone_d1, d2=vEdgeBoltCone_d2, h=vEdgeBoltCone_h);
            
        // hinge columns
            //left column
            translate([vHingeColumn_offsetX, vHingeColumnLeft_offsetY, vHingeColumn_offsetZ])
                cube([vHingeColumn_l, vHingeColumn_w, vHingeColumn_h]);
            //right column
            translate([vHingeColumn_offsetX, vHingeColumnRight_offsetY, vHingeColumn_offsetZ])
                cube([vHingeColumn_l, vHingeColumn_w, vHingeColumn_h]);
              
        // hinge tube
            // left
            translate([vHinge_offsetX, vHinge_offsetY, vHinge_offsetZ])
                rotate([-90, 0, 0])
                    cylinder(d=vHingeOuter_d, h=vHingeOuter_h);
            // right
            translate([vHinge_offsetX, -vHinge_offsetY, vHinge_offsetZ])
                rotate([90, 0, 0])
                    cylinder(d=vHingeOuter_d, h=vHingeOuter_h);
        
        // stabilizer / dove tail plate
        translate([vStabilizerBlock_offsetX, vStabilizerBlock_offsetY, vStabilizerBlock_offsetZ])
            rotate([0, 270, 0])
                intersection(){
                    roof(vStabilizerBlock_l, vStabilizerBlock_w, vStabilizerBlock_w/4);
                    cube([vStabilizerBlock_l, vStabilizerBlock_w, vStabilizerBlock_h]);
                };
        
            };
    
    // back plate cutout
    translate([vBackPlateCutout_offsetX, vBackPlateCutout_offsetY, vBackPlateCutout_offsetZ])
        cube([vBackPlateCutout_l, vBackPlateCutout_w, vBackPlateCutout_h]);
    
    // back window
    translate([vBackWindow_offsetX, vBackWindow_offsetY, vBackWindow_offsetZ])
        cube([vBackWindow_l, vBackWindow_w, vBackWindow_h]); 
     
    // cutout for bellows frame (pyramid)
    translate([vBellowsFrameCutout_offsetX, vBellowsFrameCutout_offsetY, vBellowsFrameCutout_offsetZ])
        rotate([0,0,45])
            cylinder(d1=vBellowsFrameCutoutLower_d, d2=vBellowsFrameCutoutUpper_d, h=vBellowsFrameCutout_h, $fn=4);
    
    // side wall cutouts for hinges
    // cutout for the hinges
    translate([vHingeWallCutout_offsetX, vHingeWallCutout_offsetY, vHingeWallCutout_offsetZ])
        rotate([-90, 0, 0])
            cylinder(d=vHingeWallCutout_d, h=vHingeWallCutout_h);
    translate([vHingeWallCutout_offsetX, -vHingeWallCutout_offsetY, vHingeWallCutout_offsetZ])
        rotate([90, 0, 0])
            cylinder(d=vHingeWallCutout_d, h=vHingeWallCutout_h);        
    
    // hinge holes
        // left
        translate([vHinge_offsetX, vHinge_offsetY, vHinge_offsetZ])
            rotate([-90, 0, 0])
                cylinder(d=vHingeInner_d, h=vHingeInner_h);
        // right
        translate([vHinge_offsetX, -vHinge_offsetY, vHinge_offsetZ])
            rotate([90, 0, 0])
                cylinder(d=vHingeInner_d, h=vHingeInner_h);
    
    // screw holes for the bellows screws
        // left
        translate([vBellowsScrew_offsetX, vBellowsScrew_offsetY, vBellowsScrew_offsetZ])
            rotate([-90, 0, 0])
                countersunk_screw(vBellowsScrew_d, vBellowsScrew_h);
        translate([-vBellowsScrew_offsetX, vBellowsScrew_offsetY, vBellowsScrew_offsetZ])
            rotate([-90, 0, 0])
                countersunk_screw(vBellowsScrew_d, vBellowsScrew_h);
        // right
        translate([vBellowsScrew_offsetX, -vBellowsScrew_offsetY, vBellowsScrew_offsetZ])
            rotate([90, 0, 0])
                countersunk_screw(vBellowsScrew_d, vBellowsScrew_h);
        translate([-vBellowsScrew_offsetX, -vBellowsScrew_offsetY, vBellowsScrew_offsetZ])
            rotate([90, 0, 0])
                countersunk_screw(vBellowsScrew_d, vBellowsScrew_h);
                
    // screw holes for back plate
        // top/lock
        translate([vBackPlateLockScrewHole_offsetX, vBackPlateLockScrewHole_offsetY, vBackPlateScrewHole_offsetZ])
            cylinder(d=vBackPlateScrewHole_d, h=vBackPlateScrewHole_h);
        translate([vBackPlateLockScrewHole_offsetX, -vBackPlateLockScrewHole_offsetY, vBackPlateScrewHole_offsetZ])
            cylinder(d=vBackPlateScrewHole_d, h=vBackPlateScrewHole_h);
            
        // bottom rail
        translate([vBackPlateRailScrewHole_offsetX, vBackPlateRailScrewHole_offsetYa, vBackPlateScrewHole_offsetZ])
            cylinder(d=vBackPlateScrewHole_d, h=vBackPlateScrewHole_h);
        translate([vBackPlateRailScrewHole_offsetX, vBackPlateRailScrewHole_offsetYi, vBackPlateScrewHole_offsetZ])
            cylinder(d=vBackPlateScrewHole_d, h=vBackPlateScrewHole_h);    
        translate([vBackPlateRailScrewHole_offsetX, -vBackPlateRailScrewHole_offsetYa, vBackPlateScrewHole_offsetZ])
            cylinder(d=vBackPlateScrewHole_d, h=vBackPlateScrewHole_h);
        translate([vBackPlateRailScrewHole_offsetX, -vBackPlateRailScrewHole_offsetYi, vBackPlateScrewHole_offsetZ])
            cylinder(d=vBackPlateScrewHole_d, h=vBackPlateScrewHole_h);
            
    // stabilizer / dove tail
        // tolerance cutout
        translate([vStabilizerDovetailToleranceCutout_offsetX, vStabilizerDovetailToleranceCutout_offsetY, vStabilizerDovetailToleranceCutout_offsetZ])
            cube([vStabilizerDovetailToleranceCutout_l, vStabilizerDovetailToleranceCutout_w, vStabilizerDovetailToleranceCutout_h]); 
        // dovetail
        translate([vStabilizerDovetail_offsetX, vStabilizerDovetail_offsetY, vStabilizerDovetail_offsetZ])
            rotate([0, 270, 0])
                roof(vStabilizerDovetail_l, vStabilizerDovetail_w, vStabilizerDovetail_w/2);
                    
    // stabilizer locking hole
    translate([vLockingHole_offsetX, vLockingHole_offsetY, vLockingHole_offsetZ])
        rotate([0, 90, 0])
            cylinder(d=vLockingHole_d, h=vLockingHole_h);
    
    // lid lock holes
    translate([vLidLockHole_offsetX, vLidLockHole_offsetY, vLidLockHole_offsetZ])
        rotate([0, 90, 0])
            cylinder(d=vLidLockHole_d, h=vLidLockHole_h);
    translate([vLidLockHole_offsetX, -vLidLockHole_offsetY, vLidLockHole_offsetZ])
        rotate([0, 90, 0])
            cylinder(d=vLidLockHole_d, h=vLidLockHole_h);
    
    };
        
 };
 
 body();
